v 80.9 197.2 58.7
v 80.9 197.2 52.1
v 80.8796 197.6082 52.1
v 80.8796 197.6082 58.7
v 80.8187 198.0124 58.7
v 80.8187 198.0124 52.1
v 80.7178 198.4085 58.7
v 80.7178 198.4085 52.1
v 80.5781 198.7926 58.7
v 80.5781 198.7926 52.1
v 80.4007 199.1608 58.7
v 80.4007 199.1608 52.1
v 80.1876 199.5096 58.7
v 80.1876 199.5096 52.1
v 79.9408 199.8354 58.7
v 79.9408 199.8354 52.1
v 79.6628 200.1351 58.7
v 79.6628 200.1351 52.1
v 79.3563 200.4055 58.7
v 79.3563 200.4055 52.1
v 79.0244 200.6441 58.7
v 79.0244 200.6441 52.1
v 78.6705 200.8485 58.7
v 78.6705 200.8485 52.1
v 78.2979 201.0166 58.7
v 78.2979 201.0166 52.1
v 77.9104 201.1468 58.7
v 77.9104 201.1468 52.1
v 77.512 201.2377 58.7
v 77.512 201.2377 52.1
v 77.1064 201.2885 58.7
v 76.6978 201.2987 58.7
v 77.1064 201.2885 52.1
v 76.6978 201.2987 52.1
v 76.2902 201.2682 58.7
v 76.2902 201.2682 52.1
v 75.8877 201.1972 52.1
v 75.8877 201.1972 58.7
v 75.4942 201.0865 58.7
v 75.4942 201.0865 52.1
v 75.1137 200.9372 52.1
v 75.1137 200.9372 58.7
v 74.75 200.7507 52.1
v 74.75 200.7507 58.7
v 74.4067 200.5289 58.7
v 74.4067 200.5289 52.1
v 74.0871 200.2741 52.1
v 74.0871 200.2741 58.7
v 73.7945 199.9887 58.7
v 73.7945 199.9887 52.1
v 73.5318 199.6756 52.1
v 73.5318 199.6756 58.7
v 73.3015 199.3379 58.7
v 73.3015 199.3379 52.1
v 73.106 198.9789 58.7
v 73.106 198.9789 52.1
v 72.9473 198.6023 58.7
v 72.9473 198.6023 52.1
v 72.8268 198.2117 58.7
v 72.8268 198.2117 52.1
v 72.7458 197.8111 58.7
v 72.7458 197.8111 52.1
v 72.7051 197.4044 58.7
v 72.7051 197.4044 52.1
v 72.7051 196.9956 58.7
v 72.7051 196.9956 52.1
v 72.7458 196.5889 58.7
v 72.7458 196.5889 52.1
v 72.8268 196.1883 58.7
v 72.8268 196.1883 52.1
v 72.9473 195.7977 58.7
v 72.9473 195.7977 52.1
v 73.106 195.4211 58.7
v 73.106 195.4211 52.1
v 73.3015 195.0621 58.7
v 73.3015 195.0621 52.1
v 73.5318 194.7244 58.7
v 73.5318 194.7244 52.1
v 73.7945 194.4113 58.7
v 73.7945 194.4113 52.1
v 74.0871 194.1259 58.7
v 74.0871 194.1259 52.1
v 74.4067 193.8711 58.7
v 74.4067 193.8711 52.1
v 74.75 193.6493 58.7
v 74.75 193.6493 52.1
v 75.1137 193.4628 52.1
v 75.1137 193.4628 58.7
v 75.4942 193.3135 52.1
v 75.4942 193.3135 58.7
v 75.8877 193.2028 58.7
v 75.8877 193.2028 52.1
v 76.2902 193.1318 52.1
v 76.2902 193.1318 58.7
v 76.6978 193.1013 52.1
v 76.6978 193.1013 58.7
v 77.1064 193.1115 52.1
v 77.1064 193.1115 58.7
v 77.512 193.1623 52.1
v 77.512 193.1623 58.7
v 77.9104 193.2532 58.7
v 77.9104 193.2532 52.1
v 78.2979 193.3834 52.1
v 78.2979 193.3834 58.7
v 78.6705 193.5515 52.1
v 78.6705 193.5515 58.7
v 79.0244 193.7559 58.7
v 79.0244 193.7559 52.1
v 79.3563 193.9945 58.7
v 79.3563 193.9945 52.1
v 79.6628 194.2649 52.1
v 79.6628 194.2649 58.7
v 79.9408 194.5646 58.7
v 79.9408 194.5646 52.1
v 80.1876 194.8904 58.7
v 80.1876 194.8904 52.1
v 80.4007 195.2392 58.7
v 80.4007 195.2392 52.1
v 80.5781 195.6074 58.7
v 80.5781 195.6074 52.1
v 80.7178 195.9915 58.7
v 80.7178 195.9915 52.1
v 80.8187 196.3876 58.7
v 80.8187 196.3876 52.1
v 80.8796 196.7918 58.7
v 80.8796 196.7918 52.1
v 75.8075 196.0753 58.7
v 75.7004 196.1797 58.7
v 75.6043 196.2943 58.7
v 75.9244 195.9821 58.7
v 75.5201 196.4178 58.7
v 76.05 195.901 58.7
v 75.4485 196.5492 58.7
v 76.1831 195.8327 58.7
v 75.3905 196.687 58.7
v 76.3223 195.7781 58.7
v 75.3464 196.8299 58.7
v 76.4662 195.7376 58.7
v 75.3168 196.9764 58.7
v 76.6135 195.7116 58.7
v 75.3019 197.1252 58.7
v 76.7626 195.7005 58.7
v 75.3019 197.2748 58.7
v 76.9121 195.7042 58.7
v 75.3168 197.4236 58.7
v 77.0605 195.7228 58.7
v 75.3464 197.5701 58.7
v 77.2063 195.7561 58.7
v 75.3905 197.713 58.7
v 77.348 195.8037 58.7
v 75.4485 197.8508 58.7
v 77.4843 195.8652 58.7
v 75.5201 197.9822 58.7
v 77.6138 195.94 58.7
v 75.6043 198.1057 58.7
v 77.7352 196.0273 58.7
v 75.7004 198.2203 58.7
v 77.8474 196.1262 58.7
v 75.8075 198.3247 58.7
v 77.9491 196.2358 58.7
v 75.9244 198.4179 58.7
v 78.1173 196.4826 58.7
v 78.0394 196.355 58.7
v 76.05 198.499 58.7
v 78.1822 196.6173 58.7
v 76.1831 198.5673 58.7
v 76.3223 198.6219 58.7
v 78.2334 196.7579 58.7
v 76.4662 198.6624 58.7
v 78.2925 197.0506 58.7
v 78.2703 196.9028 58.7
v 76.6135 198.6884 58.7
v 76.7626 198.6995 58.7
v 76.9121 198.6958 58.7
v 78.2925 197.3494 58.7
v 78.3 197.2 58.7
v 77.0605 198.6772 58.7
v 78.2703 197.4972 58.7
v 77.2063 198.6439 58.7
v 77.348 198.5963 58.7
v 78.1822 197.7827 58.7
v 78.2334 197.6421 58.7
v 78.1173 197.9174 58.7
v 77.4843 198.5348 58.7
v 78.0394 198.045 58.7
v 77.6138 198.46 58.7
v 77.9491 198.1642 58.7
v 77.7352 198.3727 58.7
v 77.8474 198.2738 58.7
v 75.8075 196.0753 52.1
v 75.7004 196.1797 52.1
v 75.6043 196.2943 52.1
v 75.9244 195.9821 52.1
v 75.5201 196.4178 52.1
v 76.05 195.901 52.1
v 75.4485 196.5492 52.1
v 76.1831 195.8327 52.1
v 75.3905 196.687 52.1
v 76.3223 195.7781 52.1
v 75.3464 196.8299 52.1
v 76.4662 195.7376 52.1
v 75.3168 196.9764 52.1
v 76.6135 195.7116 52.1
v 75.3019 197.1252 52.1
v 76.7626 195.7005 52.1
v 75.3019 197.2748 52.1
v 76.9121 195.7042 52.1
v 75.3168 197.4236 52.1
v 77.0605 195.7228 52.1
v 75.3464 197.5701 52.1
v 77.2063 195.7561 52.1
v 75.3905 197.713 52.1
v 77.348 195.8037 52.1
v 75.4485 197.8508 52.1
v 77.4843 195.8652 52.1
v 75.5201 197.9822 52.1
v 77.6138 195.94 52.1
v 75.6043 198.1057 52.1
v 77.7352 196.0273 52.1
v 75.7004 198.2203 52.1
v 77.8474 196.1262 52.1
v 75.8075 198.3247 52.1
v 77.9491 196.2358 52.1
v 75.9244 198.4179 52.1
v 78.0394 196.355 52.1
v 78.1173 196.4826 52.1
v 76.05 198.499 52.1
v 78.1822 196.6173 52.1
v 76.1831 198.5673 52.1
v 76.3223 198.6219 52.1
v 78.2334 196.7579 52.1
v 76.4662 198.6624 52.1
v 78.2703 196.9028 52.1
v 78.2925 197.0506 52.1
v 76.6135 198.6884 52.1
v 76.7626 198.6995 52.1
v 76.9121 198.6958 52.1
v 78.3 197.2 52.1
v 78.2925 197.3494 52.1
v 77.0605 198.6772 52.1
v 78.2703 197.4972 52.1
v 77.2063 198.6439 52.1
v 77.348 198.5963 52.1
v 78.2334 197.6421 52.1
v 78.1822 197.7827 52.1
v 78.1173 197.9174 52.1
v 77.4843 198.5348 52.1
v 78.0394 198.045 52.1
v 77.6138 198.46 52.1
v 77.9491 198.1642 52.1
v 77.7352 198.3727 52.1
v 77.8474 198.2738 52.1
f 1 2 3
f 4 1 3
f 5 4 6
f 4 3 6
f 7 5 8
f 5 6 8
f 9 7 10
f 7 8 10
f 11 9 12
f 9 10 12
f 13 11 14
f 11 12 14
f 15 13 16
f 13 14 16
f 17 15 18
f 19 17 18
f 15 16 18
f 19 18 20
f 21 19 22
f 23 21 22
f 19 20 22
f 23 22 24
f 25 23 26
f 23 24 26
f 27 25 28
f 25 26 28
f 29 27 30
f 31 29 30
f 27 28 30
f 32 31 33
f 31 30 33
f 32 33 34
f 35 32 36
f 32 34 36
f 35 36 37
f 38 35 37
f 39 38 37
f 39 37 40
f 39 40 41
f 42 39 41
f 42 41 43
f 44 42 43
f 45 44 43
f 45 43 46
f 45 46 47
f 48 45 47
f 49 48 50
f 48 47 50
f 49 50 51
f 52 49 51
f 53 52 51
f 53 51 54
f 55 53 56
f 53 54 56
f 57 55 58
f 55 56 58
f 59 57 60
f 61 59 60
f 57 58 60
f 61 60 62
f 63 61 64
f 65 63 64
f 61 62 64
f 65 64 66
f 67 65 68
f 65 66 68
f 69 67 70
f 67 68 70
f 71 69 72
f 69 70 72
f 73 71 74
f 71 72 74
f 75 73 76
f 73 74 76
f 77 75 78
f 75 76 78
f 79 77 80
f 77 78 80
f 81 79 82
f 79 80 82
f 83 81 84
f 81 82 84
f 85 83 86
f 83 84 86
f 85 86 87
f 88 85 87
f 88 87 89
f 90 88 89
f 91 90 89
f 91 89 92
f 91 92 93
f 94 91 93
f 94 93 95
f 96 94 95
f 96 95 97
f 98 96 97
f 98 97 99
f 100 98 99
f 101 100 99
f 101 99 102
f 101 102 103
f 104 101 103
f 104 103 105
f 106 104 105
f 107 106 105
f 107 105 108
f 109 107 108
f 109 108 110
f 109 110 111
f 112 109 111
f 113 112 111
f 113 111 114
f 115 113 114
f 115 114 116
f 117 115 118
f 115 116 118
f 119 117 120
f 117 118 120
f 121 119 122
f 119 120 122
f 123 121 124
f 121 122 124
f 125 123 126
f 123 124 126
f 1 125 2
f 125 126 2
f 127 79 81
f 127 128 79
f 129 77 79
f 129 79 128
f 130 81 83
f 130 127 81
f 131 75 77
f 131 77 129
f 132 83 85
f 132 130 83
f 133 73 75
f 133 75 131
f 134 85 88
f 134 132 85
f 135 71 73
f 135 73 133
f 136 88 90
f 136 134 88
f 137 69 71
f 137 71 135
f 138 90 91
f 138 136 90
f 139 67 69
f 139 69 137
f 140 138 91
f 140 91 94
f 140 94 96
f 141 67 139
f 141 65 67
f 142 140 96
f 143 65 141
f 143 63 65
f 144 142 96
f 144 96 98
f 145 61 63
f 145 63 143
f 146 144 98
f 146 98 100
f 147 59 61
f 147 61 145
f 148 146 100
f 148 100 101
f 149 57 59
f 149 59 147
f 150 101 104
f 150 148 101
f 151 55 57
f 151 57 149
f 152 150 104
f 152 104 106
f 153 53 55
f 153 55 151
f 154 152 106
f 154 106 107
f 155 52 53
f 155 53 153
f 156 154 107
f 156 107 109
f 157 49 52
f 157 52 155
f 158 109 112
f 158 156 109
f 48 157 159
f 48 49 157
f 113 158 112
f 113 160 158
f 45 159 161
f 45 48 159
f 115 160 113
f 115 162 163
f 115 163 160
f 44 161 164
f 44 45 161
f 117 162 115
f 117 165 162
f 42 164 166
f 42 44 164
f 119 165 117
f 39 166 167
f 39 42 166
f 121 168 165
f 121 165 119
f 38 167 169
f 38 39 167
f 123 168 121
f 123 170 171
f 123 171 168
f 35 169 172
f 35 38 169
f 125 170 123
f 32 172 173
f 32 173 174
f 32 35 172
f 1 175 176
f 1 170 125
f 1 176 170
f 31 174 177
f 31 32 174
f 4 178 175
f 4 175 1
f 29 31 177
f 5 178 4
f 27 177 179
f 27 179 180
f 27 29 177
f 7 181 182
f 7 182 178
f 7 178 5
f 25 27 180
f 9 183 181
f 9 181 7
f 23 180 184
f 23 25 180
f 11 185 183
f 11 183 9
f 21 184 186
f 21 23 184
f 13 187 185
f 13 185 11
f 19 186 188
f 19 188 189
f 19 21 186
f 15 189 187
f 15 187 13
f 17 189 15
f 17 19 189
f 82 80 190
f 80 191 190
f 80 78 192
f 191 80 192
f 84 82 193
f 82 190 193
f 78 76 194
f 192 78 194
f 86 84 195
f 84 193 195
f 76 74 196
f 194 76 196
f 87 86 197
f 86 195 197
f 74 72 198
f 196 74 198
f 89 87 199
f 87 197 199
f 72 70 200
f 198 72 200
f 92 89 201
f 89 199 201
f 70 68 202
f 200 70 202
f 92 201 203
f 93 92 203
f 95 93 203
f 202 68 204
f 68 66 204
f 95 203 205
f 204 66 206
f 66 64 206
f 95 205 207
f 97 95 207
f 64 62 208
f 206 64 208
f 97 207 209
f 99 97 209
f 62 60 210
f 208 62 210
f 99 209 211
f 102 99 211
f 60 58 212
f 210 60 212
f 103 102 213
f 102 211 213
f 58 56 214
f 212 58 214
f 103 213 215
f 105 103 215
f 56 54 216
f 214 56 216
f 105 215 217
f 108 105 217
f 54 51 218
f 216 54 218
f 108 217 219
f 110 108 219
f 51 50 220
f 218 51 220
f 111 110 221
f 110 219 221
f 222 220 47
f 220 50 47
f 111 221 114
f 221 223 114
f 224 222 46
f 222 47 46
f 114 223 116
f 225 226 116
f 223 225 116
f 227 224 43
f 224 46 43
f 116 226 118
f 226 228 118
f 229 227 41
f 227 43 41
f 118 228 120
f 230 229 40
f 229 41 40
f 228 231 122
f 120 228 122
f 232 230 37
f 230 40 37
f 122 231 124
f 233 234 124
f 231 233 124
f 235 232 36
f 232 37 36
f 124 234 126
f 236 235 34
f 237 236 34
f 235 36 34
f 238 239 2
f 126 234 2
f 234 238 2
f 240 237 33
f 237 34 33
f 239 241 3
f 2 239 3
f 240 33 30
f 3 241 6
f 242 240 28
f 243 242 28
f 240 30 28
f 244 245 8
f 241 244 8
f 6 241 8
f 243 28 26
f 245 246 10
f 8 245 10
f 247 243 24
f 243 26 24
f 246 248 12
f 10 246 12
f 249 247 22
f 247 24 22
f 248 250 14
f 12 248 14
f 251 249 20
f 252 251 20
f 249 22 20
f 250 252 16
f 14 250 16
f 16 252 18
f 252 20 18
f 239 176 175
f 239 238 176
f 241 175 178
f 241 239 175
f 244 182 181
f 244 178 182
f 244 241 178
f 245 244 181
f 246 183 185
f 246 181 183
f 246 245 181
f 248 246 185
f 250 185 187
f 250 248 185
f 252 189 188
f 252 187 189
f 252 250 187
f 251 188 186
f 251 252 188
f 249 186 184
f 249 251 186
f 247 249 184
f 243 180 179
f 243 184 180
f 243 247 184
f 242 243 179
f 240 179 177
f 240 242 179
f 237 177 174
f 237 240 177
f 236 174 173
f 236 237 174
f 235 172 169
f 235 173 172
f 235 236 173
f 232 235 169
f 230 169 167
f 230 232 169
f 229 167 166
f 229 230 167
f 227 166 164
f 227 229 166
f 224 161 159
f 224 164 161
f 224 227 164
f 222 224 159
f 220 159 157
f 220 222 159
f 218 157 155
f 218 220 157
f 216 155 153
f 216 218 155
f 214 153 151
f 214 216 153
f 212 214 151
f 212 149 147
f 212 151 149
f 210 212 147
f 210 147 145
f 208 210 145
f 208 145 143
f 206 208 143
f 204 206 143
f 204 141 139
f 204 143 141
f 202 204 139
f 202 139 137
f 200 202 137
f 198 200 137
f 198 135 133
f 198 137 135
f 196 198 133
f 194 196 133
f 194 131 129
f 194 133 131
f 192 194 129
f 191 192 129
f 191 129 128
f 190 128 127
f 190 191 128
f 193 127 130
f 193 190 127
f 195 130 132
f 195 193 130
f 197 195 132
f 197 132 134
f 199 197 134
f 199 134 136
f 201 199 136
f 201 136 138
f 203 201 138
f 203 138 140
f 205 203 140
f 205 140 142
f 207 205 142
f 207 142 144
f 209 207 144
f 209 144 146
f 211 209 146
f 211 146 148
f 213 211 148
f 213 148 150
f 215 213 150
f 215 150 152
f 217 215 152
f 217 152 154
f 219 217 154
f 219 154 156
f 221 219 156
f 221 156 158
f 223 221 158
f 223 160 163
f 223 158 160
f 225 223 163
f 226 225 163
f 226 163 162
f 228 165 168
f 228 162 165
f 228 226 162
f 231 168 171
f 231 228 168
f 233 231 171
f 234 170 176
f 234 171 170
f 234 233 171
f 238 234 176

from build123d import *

# Parameters (mm, degrees)
CYLINDER220_R     = 1.5
CYLINDER220_DEPTH = 10
CYLINDER093_R     = 4.1
CYLINDER093_DEPTH = 6.6


with BuildPart() as cylinder220:
    # Cylinder220 → Cylinder220 (new body)
    with BuildSketch(Plane.XY.offset(-1.9)):
        Circle(CYLINDER220_R)
    extrude(amount=CYLINDER220_DEPTH)


with BuildPart() as cut006:
    # Cylinder093 → Cylinder093 (new body)
    with BuildSketch(Plane.XY):
        Circle(CYLINDER093_R)
    extrude(amount=CYLINDER093_DEPTH)

    # Cut006: cut Cylinder220
    add(cylinder220.part, mode=Mode.SUBTRACT)


with BuildPart() as cut006_1:
    # Cut006 placement: moved
    add(cut006.part.moved(Location((76.8, 197.2, 52.1))))


solid = cut006_1.part
